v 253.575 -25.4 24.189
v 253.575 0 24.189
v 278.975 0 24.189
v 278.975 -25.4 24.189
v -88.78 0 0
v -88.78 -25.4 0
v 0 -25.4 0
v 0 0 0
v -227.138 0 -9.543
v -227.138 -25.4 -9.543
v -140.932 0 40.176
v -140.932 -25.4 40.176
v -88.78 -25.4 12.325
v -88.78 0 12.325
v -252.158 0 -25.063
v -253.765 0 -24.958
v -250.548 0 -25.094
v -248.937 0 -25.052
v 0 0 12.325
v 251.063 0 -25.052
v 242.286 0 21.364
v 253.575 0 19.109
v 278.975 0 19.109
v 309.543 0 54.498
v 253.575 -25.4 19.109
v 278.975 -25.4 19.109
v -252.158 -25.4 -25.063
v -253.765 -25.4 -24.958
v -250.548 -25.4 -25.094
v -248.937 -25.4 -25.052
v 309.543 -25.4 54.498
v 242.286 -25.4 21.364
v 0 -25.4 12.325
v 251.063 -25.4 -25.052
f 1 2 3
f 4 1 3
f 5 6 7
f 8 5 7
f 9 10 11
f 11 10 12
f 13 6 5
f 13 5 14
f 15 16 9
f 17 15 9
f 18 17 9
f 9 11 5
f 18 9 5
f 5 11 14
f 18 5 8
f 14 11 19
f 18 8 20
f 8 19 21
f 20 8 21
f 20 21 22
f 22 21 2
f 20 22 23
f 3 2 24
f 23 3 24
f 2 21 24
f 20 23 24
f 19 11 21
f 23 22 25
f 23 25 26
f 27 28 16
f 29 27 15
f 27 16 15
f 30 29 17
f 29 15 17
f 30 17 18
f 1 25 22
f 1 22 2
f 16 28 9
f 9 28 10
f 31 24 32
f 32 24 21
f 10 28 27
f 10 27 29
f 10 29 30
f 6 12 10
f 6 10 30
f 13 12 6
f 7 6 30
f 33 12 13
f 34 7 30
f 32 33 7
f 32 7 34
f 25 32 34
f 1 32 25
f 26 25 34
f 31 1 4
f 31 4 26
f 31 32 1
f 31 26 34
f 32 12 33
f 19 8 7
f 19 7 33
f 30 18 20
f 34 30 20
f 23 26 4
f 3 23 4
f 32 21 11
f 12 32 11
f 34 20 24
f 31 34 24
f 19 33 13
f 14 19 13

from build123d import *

# Parameters (mm, degrees)
F1_DEPTH  = 25.4
F2_DEPTH  = 25.4
F3_DEPTH  = 25.4
F5_DEPTH  = 25.4
F7_DEPTH  = 25.4
F9_DEPTH  = 25.4
F10_DEPTH = 25.4
F12_DEPTH = 25.4
F15_DEPTH = 25.4
F16_DEPTH = 25.4
F18_DEPTH = 25.4
F20_DEPTH = 25.4
F21_W     = 25.4
F21_H     = 5.08
F22_DEPTH = 25.4


with BuildPart() as f1:
    # F0 (on Front) → F1 (new body)
    with BuildSketch(Plane.XZ):
        with BuildLine():
            ThreePointArc((-248.9374864935, 45.4784197962), (-285.9761731261, 10.2133885569), (-248.9374864935, -25.0516426824))
            Line((-248.9374864935, -25.0516426824), (251.0625135065, -25.0516426824))
            Line((251.0625135065, -25.0516426824), (309.5429599858, 54.4976872176))
            Line((309.5429599858, 54.4976872176), (242.2861912184, 21.3638611095))
            Line((242.2861912184, 21.3638611095), (-248.9374864935, 45.4784197962))
        make_face()
    extrude(amount=F1_DEPTH)

    # F0 (on Front) → F2 (join)
    with BuildSketch(Plane.XZ):
        with BuildLine():
            ThreePointArc((-248.9374864935, 45.4784197962), (-285.9761731261, 10.2133885569), (-248.9374864935, -25.0516426824))
            Line((-248.9374864935, -25.0516426824), (251.0625135065, -25.0516426824))
            Line((251.0625135065, -25.0516426824), (309.5429599858, 54.4976872176))
            Line((309.5429599858, 54.4976872176), (242.2861912184, 21.3638611095))
            Line((242.2861912184, 21.3638611095), (-248.9374864935, 45.4784197962))
        make_face()
    extrude(amount=F2_DEPTH)

    # F0 (on Front) → F3 (join)
    with BuildSketch(Plane.XZ):
        with BuildLine():
            ThreePointArc((-248.9374864935, 45.4784197962), (-285.9761731261, 10.2133885569), (-248.9374864935, -25.0516426824))
            Line((-248.9374864935, -25.0516426824), (251.0625135065, -25.0516426824))
            Line((251.0625135065, -25.0516426824), (309.5429599858, 54.4976872176))
            Line((309.5429599858, 54.4976872176), (242.2861912184, 21.3638611095))
            Line((242.2861912184, 21.3638611095), (-248.9374864935, 45.4784197962))
        make_face()
    extrude(amount=F3_DEPTH)

    # F4 (on face) → F5 (cut)
    with BuildSketch(Plane.XZ.offset(25.4)):
        with BuildLine():
            ThreePointArc((-88.7798070908, 12.3247159645), (-95.8567415785, 6.1623579822), (-88.7798070908, 0))
            Line((-88.7798070908, 0), (0, 0))
            Line((0, 0), (-88.7798070908, 12.3247159645))
        make_face()
    extrude(amount=-F5_DEPTH, mode=Mode.SUBTRACT)

    # F6 (on face) → F7 (cut)
    with BuildSketch(Plane.XZ.offset(25.4)):
        Polygon((0, 0), (-88.7798070908, 12.3247159645), (-88.7798070908, 0), align=None)
        Polygon((0, 12.3247159645), (-88.7798070908, 12.3247159645), (0, 0), align=None)
    extrude(amount=-F7_DEPTH, mode=Mode.SUBTRACT)

    # F11 (on face) → F12 (join)
    with BuildSketch(Plane.XZ.offset(25.4)):
        with BuildLine():
            ThreePointArc((-88.7798070908, 12.3247159645), (-95.8567415785, 6.1623579822), (-88.7798070908, 0))
            Line((-88.7798070908, 0), (-88.7798070908, 12.3247159645))
        make_face()
        with BuildLine():
            Line((-110.1938635111, -10.0966589525), (-88.7798070908, -10.0966589525))
            Line((-88.7798070908, -10.0966589525), (-88.7798070908, 0))
            ThreePointArc((-88.7798070908, 0), (-95.8567415785, 6.1623579822), (-88.7798070908, 12.3247159645))
            Line((-88.7798070908, 12.3247159645), (-88.7798070908, 19.2268192768))
            Line((-88.7798070908, 19.2268192768), (-110.1938635111, 19.2268192768))
            Line((-110.1938635111, 19.2268192768), (-110.1938635111, -10.0966589525))
        make_face()
    extrude(amount=-F12_DEPTH)

    # F13 (on face) → F15 (join)
    with BuildSketch(Plane.XZ.offset(25.4)):
        with BuildLine():
            ThreePointArc((-248.9374864935, 45.4784197962), (-285.9761731261, 10.2133885569), (-248.9374864935, -25.0516426824))
            Line((-248.9374864935, -25.0516426824), (-130.9048912587, 39.6841063828))
            Line((-130.9048912587, 39.6841063828), (-248.9374864935, 45.4784197962))
        make_face()
    extrude(amount=F15_DEPTH)

    # F16 (cut): a face of the model
    f16_faces = [f1.faces().sort_by_distance(p)[0] for p in [
        (-227.9648580508, -50.8, 16.7633050422),
    ]]
    extrude(f16_faces, amount=-F16_DEPTH, mode=Mode.SUBTRACT)

    # F17 (on face) → F18 (cut)
    with BuildSketch(Plane.XZ.offset(25.4)):
        Polygon((-310.474216938, -22.743826732), (-255.3424239159, -25.8090943098), (-138.7038677931, 41.4615124464), (-278.6701321602, 55.0241321325), align=None)
    extrude(amount=-F18_DEPTH, mode=Mode.SUBTRACT)

    # F19 (on face) → F20 (cut)
    with BuildSketch(Plane.XZ.offset(25.4)):
        Polygon((-265.600413084, -31.8100675941), (-141.2684768438, 40.1715748012), (-274.7080028057, 68.8641965389), (-321.2986290455, 3.4738616087), align=None)
    extrude(amount=-F20_DEPTH, mode=Mode.SUBTRACT)

    # F21 (on face) → F22 (cut)
    with BuildSketch(Plane.XZ.offset(25.4)):
        with Locations((266.2754654884, 21.6490322659)):
            Rectangle(F21_W, F21_H)
    extrude(amount=-F22_DEPTH, mode=Mode.SUBTRACT)


with BuildPart() as f9:
    # F8 (on face) → F9 (new body)
    with BuildSketch(Plane.XZ.offset(25.4)):
        with BuildLine():
            Line((-88.7798070908, 0), (-88.7798070908, 12.3247159645))
            ThreePointArc((-88.7798070908, 12.3247159645), (-95.8567415785, 6.1623579822), (-88.7798070908, 0))
        make_face()
    extrude(amount=F9_DEPTH)

    # F10 (cut): a face of the model
    f10_faces = [f9.faces().sort_by_distance(p)[0] for p in [
        (-91.8199479987, -50.8, 6.1623579822),
    ]]
    extrude(f10_faces, amount=-F10_DEPTH, mode=Mode.SUBTRACT)


solid = f1.part
